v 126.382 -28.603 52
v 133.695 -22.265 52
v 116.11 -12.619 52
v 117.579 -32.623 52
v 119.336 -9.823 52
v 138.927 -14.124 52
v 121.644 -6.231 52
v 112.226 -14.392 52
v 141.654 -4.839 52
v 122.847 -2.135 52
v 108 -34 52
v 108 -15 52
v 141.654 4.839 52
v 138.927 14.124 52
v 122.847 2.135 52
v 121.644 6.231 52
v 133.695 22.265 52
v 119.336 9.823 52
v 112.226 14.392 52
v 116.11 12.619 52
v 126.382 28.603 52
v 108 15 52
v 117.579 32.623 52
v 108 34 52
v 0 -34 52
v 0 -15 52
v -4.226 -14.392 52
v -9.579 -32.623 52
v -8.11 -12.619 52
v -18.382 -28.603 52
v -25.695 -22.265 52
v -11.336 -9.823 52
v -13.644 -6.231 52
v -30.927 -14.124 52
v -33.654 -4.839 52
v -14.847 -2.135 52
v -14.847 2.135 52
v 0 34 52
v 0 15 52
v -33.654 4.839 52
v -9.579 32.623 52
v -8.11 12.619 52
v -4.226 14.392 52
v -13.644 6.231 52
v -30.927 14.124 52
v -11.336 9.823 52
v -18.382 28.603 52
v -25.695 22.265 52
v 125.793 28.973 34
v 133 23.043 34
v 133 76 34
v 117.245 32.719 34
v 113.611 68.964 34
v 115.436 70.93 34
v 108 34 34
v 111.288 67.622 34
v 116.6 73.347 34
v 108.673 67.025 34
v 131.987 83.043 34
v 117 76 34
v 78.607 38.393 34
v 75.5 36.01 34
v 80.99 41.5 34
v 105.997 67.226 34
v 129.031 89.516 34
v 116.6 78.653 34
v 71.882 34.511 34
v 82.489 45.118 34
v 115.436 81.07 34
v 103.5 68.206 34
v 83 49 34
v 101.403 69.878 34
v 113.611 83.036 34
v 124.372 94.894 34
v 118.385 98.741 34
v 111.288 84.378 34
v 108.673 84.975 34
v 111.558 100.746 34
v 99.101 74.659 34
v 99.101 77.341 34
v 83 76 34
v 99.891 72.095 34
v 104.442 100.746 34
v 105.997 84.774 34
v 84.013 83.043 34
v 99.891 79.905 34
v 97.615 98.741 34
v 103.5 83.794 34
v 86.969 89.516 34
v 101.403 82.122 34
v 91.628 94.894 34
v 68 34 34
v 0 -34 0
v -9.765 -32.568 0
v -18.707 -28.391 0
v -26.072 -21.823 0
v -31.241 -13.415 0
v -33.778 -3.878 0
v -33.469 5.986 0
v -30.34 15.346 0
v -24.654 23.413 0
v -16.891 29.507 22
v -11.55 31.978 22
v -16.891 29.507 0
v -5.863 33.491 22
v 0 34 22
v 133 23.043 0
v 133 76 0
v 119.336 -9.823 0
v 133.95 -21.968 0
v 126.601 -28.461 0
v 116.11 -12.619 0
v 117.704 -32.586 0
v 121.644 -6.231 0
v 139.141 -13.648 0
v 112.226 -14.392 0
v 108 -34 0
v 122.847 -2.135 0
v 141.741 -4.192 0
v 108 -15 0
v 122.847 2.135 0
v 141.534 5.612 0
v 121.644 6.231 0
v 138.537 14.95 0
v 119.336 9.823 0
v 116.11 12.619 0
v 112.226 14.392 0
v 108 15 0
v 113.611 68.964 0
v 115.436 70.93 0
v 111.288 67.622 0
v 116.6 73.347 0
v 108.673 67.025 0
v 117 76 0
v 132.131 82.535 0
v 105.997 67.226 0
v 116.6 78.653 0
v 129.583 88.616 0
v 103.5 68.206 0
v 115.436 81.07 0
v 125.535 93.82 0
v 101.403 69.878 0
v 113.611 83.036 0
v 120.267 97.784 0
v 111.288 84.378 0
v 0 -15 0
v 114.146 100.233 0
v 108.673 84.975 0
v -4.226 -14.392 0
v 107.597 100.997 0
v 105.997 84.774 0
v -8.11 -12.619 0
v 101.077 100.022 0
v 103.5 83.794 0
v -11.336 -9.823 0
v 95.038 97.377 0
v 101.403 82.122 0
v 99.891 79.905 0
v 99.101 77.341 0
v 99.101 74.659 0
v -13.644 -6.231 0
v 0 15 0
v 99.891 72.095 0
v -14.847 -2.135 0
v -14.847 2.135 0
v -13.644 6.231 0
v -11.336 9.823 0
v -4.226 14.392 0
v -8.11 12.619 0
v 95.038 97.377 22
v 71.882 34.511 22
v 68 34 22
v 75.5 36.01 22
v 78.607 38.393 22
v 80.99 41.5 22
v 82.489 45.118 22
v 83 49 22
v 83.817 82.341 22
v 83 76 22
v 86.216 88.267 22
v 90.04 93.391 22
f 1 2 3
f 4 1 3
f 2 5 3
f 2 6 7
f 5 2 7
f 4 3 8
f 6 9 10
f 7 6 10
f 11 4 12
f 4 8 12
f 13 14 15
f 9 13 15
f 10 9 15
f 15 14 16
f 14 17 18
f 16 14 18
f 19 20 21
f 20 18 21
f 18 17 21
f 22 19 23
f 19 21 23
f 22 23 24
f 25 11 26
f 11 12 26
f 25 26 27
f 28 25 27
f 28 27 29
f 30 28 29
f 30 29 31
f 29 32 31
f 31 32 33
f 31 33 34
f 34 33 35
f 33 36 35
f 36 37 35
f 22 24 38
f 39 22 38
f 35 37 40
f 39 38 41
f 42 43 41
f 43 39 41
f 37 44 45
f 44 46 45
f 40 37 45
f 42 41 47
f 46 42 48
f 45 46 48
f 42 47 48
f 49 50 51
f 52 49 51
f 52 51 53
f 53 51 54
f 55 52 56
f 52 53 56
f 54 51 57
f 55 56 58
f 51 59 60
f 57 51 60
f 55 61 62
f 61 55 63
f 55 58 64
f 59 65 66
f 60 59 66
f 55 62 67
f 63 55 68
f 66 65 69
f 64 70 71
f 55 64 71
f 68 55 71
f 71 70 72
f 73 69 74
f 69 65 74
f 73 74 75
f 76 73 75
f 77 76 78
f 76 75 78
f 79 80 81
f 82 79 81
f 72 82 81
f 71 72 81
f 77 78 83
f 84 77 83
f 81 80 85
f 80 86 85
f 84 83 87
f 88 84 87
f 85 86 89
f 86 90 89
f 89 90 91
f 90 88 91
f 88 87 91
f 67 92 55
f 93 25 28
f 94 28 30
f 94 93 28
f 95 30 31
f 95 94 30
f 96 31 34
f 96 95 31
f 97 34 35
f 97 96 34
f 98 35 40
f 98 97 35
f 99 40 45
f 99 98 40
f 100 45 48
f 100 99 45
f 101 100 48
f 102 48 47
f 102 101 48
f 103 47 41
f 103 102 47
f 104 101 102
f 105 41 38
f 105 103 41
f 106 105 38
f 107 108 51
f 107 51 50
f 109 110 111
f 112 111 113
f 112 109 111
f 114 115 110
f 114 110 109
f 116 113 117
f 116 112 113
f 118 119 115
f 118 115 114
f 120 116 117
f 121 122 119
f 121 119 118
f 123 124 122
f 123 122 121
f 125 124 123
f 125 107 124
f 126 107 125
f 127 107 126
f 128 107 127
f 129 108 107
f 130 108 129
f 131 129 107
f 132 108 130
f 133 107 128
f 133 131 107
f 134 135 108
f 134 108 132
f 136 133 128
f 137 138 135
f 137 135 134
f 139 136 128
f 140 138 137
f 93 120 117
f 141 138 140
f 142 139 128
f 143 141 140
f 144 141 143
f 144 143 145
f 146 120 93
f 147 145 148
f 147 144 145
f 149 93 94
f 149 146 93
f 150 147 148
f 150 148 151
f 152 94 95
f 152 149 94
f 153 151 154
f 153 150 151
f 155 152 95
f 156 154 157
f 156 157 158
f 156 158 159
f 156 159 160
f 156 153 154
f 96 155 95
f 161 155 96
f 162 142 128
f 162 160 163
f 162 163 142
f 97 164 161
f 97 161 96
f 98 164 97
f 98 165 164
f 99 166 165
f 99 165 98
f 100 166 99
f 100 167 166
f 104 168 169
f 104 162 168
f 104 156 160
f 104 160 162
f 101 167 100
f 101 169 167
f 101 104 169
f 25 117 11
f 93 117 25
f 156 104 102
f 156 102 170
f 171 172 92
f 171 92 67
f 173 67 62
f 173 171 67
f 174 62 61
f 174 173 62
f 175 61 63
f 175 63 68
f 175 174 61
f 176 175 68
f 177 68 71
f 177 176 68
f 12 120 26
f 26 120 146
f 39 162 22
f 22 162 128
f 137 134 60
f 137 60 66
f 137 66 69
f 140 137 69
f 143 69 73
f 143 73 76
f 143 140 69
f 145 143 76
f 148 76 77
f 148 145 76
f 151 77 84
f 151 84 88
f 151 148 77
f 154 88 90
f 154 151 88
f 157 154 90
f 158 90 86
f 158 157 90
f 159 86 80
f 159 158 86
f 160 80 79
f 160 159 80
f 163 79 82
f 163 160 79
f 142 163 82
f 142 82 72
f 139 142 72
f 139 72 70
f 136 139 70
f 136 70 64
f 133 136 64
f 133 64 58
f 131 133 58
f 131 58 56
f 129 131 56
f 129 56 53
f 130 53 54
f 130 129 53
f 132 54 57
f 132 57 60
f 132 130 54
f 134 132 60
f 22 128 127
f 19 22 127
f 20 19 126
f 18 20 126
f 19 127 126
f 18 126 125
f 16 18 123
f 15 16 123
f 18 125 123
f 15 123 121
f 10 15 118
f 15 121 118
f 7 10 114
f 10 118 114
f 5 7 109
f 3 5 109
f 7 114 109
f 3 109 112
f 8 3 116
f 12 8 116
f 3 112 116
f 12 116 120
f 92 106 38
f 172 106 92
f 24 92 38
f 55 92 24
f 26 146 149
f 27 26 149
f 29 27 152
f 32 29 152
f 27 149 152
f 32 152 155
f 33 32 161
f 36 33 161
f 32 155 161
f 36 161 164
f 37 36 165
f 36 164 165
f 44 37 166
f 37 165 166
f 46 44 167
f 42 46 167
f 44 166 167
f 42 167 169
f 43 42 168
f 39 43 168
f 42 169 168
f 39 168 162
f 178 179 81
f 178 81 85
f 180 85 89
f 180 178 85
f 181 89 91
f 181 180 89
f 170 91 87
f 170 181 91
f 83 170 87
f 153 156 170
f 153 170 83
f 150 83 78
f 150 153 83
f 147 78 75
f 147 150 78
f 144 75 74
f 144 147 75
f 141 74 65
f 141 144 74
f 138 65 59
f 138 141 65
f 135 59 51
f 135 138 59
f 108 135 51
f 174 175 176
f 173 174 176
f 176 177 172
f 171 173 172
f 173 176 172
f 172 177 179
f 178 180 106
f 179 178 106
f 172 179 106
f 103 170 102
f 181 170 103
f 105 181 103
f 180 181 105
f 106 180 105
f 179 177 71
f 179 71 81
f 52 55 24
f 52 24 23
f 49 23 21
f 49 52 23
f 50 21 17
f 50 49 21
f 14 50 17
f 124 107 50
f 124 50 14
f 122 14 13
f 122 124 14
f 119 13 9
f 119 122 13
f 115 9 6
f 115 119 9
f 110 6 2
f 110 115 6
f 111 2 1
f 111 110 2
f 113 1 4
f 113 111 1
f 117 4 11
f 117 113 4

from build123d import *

# Parameters (mm, degrees)
EXTRUDE_1_DEPTH = 52
SKETCH_2_R      = 9
EXTRUDE_2_DEPTH = 34
EXTRUDE_3_DEPTH = 22


with BuildPart() as part:
    # 스케치1 → 보스-돌출1 (new body)
    with BuildSketch(Plane.XY):
        with BuildLine():
            Line((0, 34), (108, 34))
            ThreePointArc((108, 34), (142, 0), (108, -34))
            Line((108, -34), (0, -34))
            ThreePointArc((0, -34), (-34, 0), (0, 34))
        make_face()
        with BuildLine():
            Line((0, 15), (108, 15))
            ThreePointArc((108, 15), (123, 0), (108, -15))
            Line((108, -15), (0, -15))
            ThreePointArc((0, -15), (-15, 0), (0, 15))
        make_face(mode=Mode.SUBTRACT)
    extrude(amount=EXTRUDE_1_DEPTH)

    # 스케치2 → 보스-돌출2 (add)
    with BuildSketch(Plane.XY):
        with BuildLine():
            Line((108, 34), (68, 34))
            ThreePointArc((68, 34), (78.606601718, 38.393398282), (83, 49))
            Line((83, 49), (83, 76))
            ThreePointArc((83, 76), (108, 101), (133, 76))
            Line((133, 76), (133, 23.043437244))
            ThreePointArc((133, 23.043437244), (121.647767834, 31.140623519), (108, 34))
        make_face()
        with Locations((108, 76)):
            Circle(SKETCH_2_R, mode=Mode.SUBTRACT)
    extrude(amount=EXTRUDE_2_DEPTH)

    # 스케치3 → 보스-돌출3 (add)
    with BuildSketch(Plane.XY):
        with BuildLine():
            Line((-16.891194038, 29.507415407), (95.037714778, 97.377070936))
            ThreePointArc((95.037714778, 97.377070936), (86.216323421, 88.266679857), (83, 76))
            Line((83, 76), (83, 49))
            ThreePointArc((83, 49), (78.606601718, 38.393398282), (68, 34))
            Line((68, 34), (0, 34))
            ThreePointArc((0, 34), (-8.739218391, 32.857663671), (-16.891194038, 29.507415407))
        make_face()
    extrude(amount=EXTRUDE_3_DEPTH)


solid = part.part
